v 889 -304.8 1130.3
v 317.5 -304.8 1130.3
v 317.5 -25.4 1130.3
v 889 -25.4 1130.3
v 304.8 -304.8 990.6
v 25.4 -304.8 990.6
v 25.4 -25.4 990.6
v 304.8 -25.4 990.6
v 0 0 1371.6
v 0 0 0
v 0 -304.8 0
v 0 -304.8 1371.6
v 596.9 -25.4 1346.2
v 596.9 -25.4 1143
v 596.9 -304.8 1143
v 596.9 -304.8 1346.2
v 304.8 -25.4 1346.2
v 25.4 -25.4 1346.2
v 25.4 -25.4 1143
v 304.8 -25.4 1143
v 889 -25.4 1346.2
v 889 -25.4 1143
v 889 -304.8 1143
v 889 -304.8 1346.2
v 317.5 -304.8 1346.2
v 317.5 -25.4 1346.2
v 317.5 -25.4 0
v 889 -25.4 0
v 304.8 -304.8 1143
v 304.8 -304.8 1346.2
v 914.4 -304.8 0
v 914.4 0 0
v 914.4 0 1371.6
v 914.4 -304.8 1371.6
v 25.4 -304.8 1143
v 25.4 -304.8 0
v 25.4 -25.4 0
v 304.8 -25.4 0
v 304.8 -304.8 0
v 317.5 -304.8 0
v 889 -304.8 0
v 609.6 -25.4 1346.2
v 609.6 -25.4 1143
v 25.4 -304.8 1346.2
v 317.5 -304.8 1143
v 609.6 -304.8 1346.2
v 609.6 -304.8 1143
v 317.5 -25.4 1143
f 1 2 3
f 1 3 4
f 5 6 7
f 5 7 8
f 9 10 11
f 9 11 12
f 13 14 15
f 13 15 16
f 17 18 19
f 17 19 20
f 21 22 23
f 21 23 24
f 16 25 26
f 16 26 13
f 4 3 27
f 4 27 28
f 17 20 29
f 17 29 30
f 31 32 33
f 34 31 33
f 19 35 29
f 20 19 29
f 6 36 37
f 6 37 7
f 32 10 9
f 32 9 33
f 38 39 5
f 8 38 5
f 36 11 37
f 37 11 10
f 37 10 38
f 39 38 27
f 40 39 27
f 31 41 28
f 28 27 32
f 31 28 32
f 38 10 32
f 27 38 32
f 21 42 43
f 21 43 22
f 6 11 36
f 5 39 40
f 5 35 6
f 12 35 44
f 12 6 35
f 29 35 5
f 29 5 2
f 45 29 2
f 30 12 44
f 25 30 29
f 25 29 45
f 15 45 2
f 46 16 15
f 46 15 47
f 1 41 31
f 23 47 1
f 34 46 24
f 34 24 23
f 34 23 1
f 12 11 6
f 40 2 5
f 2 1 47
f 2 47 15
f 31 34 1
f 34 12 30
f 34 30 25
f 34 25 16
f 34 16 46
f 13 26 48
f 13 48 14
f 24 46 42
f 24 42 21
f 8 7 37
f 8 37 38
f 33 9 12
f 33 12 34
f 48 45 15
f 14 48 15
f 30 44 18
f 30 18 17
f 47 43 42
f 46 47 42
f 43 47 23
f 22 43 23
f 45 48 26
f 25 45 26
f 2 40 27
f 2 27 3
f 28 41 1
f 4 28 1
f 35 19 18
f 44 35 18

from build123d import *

# Parameters (mm, degrees)
F0_W     = 914.4
F0_H     = 1371.6
F1_DEPTH = 304.8
F2_W     = 571.5
F2_H     = 1130.3
F2_W_2   = 279.4
F2_H_2   = 990.6
F2_H_3   = 203.2
F3_DEPTH = 279.4


with BuildPart() as f1:
    # F0 (on Front) → F1 (new body)
    with BuildSketch(Plane.XZ):
        with Locations((457.2, 685.8)):
            Rectangle(F0_W, F0_H)
    extrude(amount=F1_DEPTH)

    # F2 (on face) → F3 (cut, through all)
    with BuildSketch(Plane.XZ.offset(304.8)):
        with Locations((603.25, 565.15)):
            Rectangle(F2_W, F2_H)
        with Locations((165.1, 495.3)):
            Rectangle(F2_W_2, F2_H_2)
        with Locations((165.1, 1244.6)):
            Rectangle(F2_W_2, F2_H_3)
        with Locations((457.2, 1244.6)):
            Rectangle(F2_W_2, F2_H_3)
        with Locations((749.3, 1244.6)):
            Rectangle(F2_W_2, F2_H_3)
    extrude(amount=-F3_DEPTH, mode=Mode.SUBTRACT)


solid = f1.part
